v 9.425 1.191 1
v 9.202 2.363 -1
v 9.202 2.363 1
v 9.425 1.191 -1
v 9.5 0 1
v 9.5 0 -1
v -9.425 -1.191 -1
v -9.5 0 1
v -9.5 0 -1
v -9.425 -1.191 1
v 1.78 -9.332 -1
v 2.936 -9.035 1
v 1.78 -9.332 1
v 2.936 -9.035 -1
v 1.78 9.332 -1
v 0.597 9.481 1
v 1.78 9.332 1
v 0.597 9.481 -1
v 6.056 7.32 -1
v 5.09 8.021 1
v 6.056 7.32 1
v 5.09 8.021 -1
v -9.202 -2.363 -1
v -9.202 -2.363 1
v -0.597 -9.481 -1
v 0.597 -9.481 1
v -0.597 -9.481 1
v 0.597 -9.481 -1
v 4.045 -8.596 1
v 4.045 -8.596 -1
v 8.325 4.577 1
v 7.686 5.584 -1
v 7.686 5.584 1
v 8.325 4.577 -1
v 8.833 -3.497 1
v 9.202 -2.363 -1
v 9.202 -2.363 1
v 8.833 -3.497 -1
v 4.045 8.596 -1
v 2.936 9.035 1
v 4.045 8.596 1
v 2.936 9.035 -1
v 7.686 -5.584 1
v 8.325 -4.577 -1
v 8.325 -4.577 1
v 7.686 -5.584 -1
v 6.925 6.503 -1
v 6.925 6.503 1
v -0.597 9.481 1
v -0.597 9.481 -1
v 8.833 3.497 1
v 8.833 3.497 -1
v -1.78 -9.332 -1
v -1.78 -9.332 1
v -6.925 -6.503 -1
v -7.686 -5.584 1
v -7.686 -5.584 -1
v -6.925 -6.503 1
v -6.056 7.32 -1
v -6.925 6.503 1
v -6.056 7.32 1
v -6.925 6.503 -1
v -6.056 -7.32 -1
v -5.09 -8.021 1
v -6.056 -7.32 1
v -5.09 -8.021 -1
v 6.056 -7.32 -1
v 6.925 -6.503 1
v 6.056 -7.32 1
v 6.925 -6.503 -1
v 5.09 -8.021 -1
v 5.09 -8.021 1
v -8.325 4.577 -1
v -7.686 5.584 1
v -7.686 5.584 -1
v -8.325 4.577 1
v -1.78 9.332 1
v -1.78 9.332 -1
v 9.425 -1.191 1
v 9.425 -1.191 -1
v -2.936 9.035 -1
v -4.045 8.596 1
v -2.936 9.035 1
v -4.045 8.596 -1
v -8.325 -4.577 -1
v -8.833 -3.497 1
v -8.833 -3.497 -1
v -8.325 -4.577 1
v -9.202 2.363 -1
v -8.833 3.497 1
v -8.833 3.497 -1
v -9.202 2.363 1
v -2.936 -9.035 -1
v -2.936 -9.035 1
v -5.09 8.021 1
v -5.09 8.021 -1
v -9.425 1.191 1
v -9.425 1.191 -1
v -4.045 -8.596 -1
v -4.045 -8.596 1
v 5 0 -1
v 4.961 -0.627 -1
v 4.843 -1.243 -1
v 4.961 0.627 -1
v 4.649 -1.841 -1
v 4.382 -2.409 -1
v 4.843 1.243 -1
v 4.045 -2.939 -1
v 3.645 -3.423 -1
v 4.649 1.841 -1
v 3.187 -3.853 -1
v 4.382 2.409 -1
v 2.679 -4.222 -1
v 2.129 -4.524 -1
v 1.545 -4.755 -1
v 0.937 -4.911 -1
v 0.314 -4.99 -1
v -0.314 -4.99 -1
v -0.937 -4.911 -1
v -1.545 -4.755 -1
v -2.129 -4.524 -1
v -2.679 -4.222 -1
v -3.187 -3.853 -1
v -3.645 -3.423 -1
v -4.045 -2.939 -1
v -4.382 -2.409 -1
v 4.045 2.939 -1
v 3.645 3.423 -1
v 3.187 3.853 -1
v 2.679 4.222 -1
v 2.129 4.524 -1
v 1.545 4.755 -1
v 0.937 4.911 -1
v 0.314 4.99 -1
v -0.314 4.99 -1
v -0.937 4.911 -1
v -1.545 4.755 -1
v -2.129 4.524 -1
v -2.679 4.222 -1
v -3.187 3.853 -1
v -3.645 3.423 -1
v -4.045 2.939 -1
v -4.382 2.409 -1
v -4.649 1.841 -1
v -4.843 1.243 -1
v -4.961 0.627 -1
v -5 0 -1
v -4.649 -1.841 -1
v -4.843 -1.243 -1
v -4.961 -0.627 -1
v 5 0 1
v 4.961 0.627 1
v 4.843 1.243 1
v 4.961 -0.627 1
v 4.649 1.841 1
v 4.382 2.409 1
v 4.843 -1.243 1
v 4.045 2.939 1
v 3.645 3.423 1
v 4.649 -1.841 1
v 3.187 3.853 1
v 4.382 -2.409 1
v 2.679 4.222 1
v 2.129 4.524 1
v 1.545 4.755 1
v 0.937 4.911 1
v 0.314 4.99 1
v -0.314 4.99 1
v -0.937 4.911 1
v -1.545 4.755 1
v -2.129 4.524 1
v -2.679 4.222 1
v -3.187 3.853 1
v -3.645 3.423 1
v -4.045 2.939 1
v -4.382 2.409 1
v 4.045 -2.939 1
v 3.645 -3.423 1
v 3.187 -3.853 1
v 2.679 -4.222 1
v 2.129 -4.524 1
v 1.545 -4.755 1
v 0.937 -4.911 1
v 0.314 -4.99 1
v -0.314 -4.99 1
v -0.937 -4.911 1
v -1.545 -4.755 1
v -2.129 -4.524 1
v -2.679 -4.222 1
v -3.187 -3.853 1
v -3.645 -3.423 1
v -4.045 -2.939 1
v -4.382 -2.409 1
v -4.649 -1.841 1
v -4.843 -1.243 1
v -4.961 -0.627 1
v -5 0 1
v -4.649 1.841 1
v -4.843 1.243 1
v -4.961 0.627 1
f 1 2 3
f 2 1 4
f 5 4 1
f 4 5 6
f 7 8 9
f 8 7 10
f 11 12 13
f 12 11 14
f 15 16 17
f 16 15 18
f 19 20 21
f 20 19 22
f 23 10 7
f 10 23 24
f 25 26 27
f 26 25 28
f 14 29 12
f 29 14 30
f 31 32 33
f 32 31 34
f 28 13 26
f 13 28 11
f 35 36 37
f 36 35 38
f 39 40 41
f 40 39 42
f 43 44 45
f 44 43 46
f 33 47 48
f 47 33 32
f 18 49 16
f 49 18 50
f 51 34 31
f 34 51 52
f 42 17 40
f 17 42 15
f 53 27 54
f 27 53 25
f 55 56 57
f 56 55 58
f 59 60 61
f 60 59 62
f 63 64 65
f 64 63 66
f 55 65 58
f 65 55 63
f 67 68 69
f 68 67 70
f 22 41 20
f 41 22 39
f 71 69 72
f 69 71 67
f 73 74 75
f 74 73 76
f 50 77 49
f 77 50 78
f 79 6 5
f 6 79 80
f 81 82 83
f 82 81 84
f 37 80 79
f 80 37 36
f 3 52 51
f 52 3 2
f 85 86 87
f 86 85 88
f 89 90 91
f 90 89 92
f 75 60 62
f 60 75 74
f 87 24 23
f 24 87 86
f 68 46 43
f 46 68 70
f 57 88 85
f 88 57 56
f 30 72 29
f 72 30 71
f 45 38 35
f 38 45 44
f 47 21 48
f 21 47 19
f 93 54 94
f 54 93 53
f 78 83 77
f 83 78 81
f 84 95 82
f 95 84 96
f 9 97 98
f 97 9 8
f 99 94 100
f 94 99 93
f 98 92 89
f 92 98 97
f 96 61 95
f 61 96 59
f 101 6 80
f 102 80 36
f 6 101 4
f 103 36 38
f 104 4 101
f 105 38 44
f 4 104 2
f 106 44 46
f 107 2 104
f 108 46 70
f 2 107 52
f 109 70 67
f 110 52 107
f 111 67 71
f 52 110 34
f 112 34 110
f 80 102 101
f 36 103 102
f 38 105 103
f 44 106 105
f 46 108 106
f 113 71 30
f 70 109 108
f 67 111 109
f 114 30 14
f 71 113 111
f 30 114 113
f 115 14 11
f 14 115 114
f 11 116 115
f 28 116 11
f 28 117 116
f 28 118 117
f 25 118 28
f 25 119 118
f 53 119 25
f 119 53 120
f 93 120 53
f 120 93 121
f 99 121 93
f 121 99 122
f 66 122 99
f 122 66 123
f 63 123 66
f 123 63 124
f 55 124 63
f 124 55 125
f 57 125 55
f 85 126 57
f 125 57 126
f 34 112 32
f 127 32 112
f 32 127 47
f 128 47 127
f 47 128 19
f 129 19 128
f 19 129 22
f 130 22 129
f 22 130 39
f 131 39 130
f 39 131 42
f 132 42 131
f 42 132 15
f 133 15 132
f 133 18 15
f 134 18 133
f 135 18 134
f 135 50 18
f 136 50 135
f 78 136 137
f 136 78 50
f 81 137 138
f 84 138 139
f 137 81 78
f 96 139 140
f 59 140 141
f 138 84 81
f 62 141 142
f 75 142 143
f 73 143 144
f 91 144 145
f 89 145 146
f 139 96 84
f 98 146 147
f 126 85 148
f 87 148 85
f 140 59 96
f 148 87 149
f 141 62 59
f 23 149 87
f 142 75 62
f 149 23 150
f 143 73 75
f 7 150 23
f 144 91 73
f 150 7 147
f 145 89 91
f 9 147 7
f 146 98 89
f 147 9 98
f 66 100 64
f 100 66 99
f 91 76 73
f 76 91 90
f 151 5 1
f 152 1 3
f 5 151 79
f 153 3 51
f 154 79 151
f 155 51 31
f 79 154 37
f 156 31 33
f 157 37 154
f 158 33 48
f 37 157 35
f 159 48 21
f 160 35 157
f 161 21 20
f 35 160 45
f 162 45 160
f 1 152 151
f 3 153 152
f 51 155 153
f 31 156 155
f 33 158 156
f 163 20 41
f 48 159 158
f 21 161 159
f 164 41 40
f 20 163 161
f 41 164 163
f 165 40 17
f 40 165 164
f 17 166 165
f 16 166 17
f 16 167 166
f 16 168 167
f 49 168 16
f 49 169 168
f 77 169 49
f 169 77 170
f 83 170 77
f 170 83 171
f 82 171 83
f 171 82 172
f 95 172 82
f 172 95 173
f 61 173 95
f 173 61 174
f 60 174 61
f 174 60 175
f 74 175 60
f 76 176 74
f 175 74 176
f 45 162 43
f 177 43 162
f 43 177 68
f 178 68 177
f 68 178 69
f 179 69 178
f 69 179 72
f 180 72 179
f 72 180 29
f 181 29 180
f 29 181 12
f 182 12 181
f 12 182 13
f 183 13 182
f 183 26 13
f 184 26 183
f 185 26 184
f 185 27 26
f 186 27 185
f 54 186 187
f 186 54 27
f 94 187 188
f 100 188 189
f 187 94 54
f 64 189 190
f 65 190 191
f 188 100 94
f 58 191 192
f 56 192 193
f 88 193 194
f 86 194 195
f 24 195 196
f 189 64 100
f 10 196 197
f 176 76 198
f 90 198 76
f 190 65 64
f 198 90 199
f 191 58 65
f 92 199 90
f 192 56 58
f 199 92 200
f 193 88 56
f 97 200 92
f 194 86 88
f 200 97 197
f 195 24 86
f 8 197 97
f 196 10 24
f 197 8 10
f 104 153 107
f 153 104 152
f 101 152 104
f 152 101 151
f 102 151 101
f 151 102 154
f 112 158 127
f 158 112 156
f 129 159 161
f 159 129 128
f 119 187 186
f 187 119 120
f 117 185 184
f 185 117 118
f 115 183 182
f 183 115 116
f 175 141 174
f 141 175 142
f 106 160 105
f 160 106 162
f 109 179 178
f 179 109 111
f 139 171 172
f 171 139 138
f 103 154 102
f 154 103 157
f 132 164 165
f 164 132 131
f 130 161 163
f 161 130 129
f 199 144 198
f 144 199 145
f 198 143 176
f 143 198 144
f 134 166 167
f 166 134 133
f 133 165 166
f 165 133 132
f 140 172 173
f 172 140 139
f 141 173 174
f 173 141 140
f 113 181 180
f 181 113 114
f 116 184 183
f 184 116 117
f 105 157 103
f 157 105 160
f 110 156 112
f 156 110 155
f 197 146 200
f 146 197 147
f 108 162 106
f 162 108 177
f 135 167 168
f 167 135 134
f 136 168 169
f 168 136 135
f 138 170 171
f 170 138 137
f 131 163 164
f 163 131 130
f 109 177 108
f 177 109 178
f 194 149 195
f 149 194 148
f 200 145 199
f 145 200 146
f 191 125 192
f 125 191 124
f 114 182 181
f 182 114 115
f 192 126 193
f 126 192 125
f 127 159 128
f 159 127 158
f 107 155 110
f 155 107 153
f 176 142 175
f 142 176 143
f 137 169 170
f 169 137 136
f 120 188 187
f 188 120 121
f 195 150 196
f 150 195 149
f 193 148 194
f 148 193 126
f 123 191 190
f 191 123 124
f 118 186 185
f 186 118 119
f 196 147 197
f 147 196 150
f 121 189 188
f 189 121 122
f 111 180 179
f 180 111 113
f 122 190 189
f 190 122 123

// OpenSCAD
$fn = 50;


difference() {
	union() {
		translate(v = [0, 0, -1.0000000000]) {
			cylinder(h = 2, r = 9.5000000000);
		}
	}
	union() {
		translate(v = [0, 0, -100.0000000000]) {
			cylinder(h = 200, r = 5.0000000000);
		}
	}
}
